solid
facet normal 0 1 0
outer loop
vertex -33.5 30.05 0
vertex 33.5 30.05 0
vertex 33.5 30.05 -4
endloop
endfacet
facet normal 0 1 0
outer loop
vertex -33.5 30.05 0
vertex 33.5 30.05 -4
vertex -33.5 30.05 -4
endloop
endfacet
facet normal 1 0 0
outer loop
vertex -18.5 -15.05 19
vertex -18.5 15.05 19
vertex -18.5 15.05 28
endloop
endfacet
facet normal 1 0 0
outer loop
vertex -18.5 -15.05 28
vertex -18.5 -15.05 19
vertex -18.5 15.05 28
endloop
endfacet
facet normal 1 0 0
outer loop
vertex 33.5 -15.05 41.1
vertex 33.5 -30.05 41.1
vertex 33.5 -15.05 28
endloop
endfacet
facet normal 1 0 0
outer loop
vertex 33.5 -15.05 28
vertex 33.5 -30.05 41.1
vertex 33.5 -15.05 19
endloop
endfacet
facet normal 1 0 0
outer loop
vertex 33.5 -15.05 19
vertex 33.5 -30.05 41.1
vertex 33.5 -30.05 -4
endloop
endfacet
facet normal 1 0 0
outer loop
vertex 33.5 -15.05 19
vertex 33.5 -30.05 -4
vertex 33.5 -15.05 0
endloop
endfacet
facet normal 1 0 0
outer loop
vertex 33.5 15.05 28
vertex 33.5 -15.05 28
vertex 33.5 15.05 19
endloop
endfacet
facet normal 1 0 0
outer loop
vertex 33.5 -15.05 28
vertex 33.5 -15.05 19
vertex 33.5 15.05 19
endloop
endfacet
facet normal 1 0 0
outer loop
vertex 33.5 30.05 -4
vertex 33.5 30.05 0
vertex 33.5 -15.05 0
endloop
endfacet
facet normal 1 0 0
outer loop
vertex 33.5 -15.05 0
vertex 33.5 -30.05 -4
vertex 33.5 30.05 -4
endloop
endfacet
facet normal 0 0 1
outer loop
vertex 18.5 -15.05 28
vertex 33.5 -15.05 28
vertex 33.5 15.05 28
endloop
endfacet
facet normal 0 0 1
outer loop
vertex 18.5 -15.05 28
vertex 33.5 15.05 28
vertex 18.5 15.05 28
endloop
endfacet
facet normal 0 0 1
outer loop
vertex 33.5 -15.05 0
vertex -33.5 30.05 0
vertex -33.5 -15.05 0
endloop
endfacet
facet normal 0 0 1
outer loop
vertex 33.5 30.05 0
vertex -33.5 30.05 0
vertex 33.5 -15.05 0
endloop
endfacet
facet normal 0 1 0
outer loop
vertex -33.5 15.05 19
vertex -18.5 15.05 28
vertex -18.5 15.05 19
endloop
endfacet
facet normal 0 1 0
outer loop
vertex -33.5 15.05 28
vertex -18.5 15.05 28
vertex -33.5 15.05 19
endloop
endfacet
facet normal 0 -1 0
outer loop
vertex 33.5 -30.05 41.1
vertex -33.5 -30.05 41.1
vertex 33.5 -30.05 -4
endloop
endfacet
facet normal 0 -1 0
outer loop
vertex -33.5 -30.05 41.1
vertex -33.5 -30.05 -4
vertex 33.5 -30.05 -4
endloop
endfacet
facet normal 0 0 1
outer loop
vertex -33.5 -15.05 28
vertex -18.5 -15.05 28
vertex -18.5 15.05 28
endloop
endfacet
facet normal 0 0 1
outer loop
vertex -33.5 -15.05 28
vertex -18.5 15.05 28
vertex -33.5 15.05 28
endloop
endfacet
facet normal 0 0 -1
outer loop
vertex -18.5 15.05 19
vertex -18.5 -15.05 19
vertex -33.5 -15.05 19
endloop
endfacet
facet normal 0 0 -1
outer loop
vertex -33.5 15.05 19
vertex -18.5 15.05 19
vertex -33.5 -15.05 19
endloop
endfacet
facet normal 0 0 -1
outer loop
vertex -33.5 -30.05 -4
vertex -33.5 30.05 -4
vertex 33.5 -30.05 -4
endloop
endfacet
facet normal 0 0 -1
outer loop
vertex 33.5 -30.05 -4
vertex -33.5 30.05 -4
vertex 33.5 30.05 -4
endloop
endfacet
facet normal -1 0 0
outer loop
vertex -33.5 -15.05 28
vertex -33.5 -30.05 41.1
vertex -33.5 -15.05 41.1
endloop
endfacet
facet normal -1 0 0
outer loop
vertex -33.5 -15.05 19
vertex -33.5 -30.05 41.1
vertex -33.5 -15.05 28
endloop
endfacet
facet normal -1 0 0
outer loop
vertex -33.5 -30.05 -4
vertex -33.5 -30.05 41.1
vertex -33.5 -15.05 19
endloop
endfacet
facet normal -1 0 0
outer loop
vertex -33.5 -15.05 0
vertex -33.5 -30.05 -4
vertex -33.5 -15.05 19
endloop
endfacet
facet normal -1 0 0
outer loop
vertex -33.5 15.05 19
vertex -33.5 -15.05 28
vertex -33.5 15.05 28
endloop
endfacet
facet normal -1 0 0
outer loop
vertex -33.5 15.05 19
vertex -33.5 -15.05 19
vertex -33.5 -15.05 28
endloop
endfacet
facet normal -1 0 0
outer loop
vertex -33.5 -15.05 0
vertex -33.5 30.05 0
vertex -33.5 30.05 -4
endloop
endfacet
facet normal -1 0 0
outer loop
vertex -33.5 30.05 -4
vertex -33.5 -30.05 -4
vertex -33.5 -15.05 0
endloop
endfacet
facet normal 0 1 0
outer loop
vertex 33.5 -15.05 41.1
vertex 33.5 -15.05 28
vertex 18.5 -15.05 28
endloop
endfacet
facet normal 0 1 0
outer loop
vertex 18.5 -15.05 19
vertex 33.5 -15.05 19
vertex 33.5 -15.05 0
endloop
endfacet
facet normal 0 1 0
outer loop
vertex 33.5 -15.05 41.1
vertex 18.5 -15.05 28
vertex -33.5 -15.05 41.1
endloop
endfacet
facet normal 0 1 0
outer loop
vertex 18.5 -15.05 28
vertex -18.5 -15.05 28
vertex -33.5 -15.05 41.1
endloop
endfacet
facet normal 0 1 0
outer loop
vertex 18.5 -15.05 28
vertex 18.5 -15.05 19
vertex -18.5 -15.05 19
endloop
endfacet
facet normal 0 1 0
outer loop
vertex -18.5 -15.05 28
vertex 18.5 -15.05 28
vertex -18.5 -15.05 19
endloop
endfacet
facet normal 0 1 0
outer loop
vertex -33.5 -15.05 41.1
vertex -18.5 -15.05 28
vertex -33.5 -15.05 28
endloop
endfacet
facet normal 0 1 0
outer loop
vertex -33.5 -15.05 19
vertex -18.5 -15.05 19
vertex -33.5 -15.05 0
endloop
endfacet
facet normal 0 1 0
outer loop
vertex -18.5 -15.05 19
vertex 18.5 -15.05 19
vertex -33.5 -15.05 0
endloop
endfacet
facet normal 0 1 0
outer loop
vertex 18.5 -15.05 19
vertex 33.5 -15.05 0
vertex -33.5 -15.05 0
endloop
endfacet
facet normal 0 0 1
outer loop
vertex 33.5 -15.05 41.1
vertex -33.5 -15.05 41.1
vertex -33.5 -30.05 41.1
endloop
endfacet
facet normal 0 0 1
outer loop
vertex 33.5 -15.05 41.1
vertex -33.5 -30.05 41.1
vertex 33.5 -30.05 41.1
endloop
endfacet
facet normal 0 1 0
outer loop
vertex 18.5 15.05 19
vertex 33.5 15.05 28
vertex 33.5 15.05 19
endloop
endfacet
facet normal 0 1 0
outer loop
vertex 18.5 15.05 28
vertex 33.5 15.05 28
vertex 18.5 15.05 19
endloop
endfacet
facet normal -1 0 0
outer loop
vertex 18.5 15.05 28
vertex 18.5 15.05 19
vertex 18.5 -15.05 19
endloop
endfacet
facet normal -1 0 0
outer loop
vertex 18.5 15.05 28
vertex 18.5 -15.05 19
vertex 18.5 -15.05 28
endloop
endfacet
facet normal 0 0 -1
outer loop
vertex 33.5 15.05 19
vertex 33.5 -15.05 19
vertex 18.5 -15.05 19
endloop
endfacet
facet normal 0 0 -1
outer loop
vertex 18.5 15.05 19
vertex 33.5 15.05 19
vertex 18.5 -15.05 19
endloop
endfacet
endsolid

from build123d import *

# Parameters (mm, degrees)
F0_W     = 37
F0_H     = 30.1
F0_H_2   = 15
F0_W_2   = 15
F1_DEPTH = 4
F2_DEPTH = 41.1
F3_W     = 15
F3_H     = 9
F4_DEPTH = 30.1


with BuildPart() as f1:
    # F0 (on Top) → F1 (new body)
    with BuildSketch(Plane.XY):
        Polygon((33.5, -15.05), (33.5, 30.05), (-33.5, 30.05), (-33.5, -15.05), (-18.5, -15.05), (-18.5, 15.05), (18.5, 15.05), (18.5, -15.05), align=None)
        Rectangle(F0_W, F0_H)
        with Locations((0, -22.55)):
            Rectangle(F0_W, F0_H_2)
        with Locations((-26, -22.55)):
            Rectangle(F0_W_2, F0_H_2)
        with Locations((26, -22.55)):
            Rectangle(F0_W_2, F0_H_2)
    extrude(amount=-F1_DEPTH)

    # F0 (on Top) → F2 (join)
    with BuildSketch(Plane.XY):
        with Locations((0, -22.55)):
            Rectangle(F0_W, F0_H_2)
        with Locations((-26, -22.55)):
            Rectangle(F0_W_2, F0_H_2)
        with Locations((26, -22.55)):
            Rectangle(F0_W_2, F0_H_2)
    extrude(amount=F2_DEPTH)

    # F3 (on face) → F4 (join)
    with BuildSketch(Plane(origin=(0, -15.05, 0), x_dir=(-1, 0, 0), z_dir=(0, 1, 0))):
        with Locations((26, 23.5)):
            Rectangle(F3_W, F3_H)
        with Locations((-26, 23.5)):
            Rectangle(F3_W, F3_H)
    extrude(amount=F4_DEPTH)


solid = f1.part
